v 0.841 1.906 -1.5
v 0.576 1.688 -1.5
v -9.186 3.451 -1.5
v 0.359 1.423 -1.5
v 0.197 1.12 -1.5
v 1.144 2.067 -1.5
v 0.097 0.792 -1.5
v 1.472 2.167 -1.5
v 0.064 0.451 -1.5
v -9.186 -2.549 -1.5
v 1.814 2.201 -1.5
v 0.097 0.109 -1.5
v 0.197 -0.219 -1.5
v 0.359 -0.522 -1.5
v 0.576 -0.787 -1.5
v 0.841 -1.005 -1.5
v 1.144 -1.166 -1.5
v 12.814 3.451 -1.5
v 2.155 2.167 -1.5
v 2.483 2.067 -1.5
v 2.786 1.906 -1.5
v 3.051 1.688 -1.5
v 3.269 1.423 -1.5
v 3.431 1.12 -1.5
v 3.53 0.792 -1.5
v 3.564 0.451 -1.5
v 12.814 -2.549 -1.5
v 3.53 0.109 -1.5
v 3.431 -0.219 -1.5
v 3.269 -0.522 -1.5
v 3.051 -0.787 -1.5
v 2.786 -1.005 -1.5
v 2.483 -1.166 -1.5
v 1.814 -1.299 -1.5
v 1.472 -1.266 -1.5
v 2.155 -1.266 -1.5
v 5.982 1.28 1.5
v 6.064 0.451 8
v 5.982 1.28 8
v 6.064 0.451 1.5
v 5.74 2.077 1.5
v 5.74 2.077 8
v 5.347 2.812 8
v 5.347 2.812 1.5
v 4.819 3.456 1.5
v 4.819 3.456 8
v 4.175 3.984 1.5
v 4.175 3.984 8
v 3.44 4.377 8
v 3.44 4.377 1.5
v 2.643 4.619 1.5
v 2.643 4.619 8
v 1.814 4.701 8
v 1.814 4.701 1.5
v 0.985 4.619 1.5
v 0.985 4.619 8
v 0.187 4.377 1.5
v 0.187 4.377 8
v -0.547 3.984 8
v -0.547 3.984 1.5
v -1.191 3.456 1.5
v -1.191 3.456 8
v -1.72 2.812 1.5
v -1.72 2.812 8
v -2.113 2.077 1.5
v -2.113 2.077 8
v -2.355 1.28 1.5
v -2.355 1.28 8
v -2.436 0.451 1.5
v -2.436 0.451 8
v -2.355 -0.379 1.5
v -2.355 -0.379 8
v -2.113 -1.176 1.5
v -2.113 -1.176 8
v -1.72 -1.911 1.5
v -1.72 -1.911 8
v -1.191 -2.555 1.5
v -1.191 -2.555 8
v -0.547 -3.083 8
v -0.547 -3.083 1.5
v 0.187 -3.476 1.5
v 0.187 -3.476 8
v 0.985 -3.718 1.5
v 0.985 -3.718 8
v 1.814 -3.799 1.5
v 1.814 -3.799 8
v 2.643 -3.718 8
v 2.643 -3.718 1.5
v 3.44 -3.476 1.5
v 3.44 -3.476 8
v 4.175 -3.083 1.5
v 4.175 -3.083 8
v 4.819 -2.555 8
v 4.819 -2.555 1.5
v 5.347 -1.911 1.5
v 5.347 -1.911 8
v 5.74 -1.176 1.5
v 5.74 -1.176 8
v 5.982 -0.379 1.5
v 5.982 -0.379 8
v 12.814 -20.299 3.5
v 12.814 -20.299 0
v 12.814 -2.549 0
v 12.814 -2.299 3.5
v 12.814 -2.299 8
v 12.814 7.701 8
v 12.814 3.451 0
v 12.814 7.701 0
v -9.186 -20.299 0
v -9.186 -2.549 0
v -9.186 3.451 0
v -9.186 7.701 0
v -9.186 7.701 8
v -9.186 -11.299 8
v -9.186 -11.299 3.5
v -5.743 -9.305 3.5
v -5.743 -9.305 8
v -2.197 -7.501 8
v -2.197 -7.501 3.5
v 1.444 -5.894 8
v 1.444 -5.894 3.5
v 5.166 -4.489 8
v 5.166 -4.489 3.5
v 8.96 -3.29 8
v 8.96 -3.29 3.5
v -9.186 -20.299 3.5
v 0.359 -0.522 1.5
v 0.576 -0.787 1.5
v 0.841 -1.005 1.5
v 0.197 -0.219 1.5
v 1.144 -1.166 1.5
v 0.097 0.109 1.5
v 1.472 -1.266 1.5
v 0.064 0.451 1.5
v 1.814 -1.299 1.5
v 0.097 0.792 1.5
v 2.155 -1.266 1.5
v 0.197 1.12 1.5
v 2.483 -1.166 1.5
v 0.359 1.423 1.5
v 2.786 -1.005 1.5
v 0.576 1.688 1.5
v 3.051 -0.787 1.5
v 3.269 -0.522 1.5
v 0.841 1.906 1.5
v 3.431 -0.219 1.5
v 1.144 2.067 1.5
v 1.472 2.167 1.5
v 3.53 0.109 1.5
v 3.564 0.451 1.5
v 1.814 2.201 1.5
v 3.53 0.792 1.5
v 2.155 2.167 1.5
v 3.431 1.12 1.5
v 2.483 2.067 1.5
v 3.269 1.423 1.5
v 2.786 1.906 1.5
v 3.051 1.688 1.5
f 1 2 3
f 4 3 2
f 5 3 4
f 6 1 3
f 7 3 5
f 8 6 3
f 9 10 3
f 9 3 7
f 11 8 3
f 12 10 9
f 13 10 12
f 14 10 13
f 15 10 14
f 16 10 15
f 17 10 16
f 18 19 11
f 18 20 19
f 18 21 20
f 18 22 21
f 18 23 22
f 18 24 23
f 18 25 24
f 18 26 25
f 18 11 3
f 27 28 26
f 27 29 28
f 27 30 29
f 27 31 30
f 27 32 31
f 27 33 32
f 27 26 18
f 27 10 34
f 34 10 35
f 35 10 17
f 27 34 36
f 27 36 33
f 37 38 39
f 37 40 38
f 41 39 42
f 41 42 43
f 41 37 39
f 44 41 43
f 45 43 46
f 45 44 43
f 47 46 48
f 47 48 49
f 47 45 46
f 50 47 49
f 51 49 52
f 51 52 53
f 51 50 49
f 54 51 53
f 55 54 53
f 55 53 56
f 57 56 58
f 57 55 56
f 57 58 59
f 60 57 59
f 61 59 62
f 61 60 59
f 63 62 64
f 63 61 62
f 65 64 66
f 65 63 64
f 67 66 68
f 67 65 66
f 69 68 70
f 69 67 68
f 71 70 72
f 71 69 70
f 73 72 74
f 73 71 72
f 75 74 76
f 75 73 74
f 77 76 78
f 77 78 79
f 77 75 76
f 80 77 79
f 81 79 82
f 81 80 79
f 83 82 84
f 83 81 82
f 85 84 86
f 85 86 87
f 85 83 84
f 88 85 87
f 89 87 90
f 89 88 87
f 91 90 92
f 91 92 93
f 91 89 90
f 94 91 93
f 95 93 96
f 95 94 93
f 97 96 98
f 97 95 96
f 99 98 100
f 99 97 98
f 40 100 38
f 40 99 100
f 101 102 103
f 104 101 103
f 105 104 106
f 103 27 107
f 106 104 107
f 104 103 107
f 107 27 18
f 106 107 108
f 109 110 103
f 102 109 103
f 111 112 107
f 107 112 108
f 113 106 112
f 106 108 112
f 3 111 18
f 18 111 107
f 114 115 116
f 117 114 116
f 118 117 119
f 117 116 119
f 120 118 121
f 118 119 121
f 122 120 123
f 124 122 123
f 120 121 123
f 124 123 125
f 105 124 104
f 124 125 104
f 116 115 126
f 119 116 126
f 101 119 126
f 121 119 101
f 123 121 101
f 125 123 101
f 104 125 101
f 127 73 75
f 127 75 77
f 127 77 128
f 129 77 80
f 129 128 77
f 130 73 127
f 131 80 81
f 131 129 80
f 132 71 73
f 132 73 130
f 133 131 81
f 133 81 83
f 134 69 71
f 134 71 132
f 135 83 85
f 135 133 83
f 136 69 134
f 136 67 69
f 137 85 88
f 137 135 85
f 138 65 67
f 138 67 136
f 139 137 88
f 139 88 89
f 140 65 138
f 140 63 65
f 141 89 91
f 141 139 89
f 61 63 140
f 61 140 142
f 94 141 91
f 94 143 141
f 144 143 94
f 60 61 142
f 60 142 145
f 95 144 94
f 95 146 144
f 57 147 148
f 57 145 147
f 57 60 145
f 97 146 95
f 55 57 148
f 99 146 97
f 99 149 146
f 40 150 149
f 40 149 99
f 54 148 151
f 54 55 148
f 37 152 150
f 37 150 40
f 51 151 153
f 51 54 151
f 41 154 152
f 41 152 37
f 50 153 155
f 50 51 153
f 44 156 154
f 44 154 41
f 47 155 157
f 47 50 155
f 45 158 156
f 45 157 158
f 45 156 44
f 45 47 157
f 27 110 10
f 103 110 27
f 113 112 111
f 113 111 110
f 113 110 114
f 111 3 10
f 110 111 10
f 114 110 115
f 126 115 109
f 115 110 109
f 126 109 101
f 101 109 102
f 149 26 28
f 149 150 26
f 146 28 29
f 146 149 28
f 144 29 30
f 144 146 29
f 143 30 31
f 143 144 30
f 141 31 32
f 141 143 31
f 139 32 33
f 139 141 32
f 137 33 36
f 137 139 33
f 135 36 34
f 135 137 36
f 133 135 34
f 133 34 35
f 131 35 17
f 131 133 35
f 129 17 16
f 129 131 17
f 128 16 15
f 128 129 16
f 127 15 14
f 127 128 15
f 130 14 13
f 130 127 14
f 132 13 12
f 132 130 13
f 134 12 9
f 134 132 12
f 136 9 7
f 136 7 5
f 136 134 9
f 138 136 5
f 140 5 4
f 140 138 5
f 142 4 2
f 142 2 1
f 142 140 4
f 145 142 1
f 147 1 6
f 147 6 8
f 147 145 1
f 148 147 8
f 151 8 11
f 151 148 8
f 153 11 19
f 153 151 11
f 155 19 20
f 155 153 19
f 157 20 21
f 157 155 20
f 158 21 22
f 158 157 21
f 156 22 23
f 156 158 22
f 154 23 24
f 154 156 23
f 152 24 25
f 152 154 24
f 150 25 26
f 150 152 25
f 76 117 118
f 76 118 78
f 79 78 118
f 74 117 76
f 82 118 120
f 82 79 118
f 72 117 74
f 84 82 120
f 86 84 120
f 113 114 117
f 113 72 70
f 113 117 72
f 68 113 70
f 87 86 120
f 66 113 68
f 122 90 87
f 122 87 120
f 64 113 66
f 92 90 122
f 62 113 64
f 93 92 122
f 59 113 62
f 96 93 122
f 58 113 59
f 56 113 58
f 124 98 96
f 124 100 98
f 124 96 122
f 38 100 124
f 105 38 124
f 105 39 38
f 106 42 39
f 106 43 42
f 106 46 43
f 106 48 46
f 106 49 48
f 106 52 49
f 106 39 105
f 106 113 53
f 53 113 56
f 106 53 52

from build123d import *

# Parameters (mm, degrees)
F0_W     = 22
F0_H     = 28
F1_DEPTH = 3.5
F2_R     = 4.25
F2_R_2   = 1.75
F3_DEPTH = 2
F4_DEPTH = 3.501
F5_W     = 22
F5_H     = 6
F5_R     = 1.75
F6_DEPTH = 1.5
F7_DEPTH = 4.5


with BuildPart() as f1:
    # F0 (on Top) → F1 (new body)
    with BuildSketch(Plane.XY):
        with Locations((1.8137441948, -6.2994613256)):
            Rectangle(F0_W, F0_H)
    extrude(amount=F1_DEPTH)

    # F2 (on face) → F3 (cut)
    with BuildSketch(Plane.XY.offset(3.5)):
        with Locations((1.8137441948, 0.4505386744)):
            Circle(F2_R)
        with Locations((1.8137441948, 0.4505386744)):
            Circle(F2_R_2, mode=Mode.SUBTRACT)
    extrude(amount=-F3_DEPTH, mode=Mode.SUBTRACT)

    # F4 (cut, through all): a face of the model
    f4_faces = [f1.faces().sort_by_distance(p)[0] for p in [
        (1.8137441948, 0.4505386744, 3.5),
    ]]
    extrude(f4_faces, amount=-F4_DEPTH, mode=Mode.SUBTRACT)

    # F5 (on face) → F6 (join)
    with BuildSketch(Plane(origin=(0, 0, 0), x_dir=(1, 0, 0), z_dir=(0, 0, -1))):
        with Locations((1.8137441948, -0.4505386744)):
            Rectangle(F5_W, F5_H)
        with Locations((1.8137441948, -0.4505386744)):
            Circle(F5_R, mode=Mode.SUBTRACT)
    extrude(amount=F6_DEPTH)

    # F2 (on face) → F7 (join)
    with BuildSketch(Plane.XY.offset(3.5)):
        with BuildLine():
            ThreePointArc((-9.1862558052, -11.2994613256), (1.4435215802, -5.8944727122), (12.8137441948, -2.2994613256))
            Line((12.8137441948, -2.2994613256), (12.8137441948, 7.7005386744))
            Line((12.8137441948, 7.7005386744), (-9.1862558052, 7.7005386744))
            Line((-9.1862558052, 7.7005386744), (-9.1862558052, -11.2994613256))
        make_face()
        with Locations((1.8137441948, 0.4505386744)):
            Circle(F2_R, mode=Mode.SUBTRACT)
    extrude(amount=F7_DEPTH)


solid = f1.part
